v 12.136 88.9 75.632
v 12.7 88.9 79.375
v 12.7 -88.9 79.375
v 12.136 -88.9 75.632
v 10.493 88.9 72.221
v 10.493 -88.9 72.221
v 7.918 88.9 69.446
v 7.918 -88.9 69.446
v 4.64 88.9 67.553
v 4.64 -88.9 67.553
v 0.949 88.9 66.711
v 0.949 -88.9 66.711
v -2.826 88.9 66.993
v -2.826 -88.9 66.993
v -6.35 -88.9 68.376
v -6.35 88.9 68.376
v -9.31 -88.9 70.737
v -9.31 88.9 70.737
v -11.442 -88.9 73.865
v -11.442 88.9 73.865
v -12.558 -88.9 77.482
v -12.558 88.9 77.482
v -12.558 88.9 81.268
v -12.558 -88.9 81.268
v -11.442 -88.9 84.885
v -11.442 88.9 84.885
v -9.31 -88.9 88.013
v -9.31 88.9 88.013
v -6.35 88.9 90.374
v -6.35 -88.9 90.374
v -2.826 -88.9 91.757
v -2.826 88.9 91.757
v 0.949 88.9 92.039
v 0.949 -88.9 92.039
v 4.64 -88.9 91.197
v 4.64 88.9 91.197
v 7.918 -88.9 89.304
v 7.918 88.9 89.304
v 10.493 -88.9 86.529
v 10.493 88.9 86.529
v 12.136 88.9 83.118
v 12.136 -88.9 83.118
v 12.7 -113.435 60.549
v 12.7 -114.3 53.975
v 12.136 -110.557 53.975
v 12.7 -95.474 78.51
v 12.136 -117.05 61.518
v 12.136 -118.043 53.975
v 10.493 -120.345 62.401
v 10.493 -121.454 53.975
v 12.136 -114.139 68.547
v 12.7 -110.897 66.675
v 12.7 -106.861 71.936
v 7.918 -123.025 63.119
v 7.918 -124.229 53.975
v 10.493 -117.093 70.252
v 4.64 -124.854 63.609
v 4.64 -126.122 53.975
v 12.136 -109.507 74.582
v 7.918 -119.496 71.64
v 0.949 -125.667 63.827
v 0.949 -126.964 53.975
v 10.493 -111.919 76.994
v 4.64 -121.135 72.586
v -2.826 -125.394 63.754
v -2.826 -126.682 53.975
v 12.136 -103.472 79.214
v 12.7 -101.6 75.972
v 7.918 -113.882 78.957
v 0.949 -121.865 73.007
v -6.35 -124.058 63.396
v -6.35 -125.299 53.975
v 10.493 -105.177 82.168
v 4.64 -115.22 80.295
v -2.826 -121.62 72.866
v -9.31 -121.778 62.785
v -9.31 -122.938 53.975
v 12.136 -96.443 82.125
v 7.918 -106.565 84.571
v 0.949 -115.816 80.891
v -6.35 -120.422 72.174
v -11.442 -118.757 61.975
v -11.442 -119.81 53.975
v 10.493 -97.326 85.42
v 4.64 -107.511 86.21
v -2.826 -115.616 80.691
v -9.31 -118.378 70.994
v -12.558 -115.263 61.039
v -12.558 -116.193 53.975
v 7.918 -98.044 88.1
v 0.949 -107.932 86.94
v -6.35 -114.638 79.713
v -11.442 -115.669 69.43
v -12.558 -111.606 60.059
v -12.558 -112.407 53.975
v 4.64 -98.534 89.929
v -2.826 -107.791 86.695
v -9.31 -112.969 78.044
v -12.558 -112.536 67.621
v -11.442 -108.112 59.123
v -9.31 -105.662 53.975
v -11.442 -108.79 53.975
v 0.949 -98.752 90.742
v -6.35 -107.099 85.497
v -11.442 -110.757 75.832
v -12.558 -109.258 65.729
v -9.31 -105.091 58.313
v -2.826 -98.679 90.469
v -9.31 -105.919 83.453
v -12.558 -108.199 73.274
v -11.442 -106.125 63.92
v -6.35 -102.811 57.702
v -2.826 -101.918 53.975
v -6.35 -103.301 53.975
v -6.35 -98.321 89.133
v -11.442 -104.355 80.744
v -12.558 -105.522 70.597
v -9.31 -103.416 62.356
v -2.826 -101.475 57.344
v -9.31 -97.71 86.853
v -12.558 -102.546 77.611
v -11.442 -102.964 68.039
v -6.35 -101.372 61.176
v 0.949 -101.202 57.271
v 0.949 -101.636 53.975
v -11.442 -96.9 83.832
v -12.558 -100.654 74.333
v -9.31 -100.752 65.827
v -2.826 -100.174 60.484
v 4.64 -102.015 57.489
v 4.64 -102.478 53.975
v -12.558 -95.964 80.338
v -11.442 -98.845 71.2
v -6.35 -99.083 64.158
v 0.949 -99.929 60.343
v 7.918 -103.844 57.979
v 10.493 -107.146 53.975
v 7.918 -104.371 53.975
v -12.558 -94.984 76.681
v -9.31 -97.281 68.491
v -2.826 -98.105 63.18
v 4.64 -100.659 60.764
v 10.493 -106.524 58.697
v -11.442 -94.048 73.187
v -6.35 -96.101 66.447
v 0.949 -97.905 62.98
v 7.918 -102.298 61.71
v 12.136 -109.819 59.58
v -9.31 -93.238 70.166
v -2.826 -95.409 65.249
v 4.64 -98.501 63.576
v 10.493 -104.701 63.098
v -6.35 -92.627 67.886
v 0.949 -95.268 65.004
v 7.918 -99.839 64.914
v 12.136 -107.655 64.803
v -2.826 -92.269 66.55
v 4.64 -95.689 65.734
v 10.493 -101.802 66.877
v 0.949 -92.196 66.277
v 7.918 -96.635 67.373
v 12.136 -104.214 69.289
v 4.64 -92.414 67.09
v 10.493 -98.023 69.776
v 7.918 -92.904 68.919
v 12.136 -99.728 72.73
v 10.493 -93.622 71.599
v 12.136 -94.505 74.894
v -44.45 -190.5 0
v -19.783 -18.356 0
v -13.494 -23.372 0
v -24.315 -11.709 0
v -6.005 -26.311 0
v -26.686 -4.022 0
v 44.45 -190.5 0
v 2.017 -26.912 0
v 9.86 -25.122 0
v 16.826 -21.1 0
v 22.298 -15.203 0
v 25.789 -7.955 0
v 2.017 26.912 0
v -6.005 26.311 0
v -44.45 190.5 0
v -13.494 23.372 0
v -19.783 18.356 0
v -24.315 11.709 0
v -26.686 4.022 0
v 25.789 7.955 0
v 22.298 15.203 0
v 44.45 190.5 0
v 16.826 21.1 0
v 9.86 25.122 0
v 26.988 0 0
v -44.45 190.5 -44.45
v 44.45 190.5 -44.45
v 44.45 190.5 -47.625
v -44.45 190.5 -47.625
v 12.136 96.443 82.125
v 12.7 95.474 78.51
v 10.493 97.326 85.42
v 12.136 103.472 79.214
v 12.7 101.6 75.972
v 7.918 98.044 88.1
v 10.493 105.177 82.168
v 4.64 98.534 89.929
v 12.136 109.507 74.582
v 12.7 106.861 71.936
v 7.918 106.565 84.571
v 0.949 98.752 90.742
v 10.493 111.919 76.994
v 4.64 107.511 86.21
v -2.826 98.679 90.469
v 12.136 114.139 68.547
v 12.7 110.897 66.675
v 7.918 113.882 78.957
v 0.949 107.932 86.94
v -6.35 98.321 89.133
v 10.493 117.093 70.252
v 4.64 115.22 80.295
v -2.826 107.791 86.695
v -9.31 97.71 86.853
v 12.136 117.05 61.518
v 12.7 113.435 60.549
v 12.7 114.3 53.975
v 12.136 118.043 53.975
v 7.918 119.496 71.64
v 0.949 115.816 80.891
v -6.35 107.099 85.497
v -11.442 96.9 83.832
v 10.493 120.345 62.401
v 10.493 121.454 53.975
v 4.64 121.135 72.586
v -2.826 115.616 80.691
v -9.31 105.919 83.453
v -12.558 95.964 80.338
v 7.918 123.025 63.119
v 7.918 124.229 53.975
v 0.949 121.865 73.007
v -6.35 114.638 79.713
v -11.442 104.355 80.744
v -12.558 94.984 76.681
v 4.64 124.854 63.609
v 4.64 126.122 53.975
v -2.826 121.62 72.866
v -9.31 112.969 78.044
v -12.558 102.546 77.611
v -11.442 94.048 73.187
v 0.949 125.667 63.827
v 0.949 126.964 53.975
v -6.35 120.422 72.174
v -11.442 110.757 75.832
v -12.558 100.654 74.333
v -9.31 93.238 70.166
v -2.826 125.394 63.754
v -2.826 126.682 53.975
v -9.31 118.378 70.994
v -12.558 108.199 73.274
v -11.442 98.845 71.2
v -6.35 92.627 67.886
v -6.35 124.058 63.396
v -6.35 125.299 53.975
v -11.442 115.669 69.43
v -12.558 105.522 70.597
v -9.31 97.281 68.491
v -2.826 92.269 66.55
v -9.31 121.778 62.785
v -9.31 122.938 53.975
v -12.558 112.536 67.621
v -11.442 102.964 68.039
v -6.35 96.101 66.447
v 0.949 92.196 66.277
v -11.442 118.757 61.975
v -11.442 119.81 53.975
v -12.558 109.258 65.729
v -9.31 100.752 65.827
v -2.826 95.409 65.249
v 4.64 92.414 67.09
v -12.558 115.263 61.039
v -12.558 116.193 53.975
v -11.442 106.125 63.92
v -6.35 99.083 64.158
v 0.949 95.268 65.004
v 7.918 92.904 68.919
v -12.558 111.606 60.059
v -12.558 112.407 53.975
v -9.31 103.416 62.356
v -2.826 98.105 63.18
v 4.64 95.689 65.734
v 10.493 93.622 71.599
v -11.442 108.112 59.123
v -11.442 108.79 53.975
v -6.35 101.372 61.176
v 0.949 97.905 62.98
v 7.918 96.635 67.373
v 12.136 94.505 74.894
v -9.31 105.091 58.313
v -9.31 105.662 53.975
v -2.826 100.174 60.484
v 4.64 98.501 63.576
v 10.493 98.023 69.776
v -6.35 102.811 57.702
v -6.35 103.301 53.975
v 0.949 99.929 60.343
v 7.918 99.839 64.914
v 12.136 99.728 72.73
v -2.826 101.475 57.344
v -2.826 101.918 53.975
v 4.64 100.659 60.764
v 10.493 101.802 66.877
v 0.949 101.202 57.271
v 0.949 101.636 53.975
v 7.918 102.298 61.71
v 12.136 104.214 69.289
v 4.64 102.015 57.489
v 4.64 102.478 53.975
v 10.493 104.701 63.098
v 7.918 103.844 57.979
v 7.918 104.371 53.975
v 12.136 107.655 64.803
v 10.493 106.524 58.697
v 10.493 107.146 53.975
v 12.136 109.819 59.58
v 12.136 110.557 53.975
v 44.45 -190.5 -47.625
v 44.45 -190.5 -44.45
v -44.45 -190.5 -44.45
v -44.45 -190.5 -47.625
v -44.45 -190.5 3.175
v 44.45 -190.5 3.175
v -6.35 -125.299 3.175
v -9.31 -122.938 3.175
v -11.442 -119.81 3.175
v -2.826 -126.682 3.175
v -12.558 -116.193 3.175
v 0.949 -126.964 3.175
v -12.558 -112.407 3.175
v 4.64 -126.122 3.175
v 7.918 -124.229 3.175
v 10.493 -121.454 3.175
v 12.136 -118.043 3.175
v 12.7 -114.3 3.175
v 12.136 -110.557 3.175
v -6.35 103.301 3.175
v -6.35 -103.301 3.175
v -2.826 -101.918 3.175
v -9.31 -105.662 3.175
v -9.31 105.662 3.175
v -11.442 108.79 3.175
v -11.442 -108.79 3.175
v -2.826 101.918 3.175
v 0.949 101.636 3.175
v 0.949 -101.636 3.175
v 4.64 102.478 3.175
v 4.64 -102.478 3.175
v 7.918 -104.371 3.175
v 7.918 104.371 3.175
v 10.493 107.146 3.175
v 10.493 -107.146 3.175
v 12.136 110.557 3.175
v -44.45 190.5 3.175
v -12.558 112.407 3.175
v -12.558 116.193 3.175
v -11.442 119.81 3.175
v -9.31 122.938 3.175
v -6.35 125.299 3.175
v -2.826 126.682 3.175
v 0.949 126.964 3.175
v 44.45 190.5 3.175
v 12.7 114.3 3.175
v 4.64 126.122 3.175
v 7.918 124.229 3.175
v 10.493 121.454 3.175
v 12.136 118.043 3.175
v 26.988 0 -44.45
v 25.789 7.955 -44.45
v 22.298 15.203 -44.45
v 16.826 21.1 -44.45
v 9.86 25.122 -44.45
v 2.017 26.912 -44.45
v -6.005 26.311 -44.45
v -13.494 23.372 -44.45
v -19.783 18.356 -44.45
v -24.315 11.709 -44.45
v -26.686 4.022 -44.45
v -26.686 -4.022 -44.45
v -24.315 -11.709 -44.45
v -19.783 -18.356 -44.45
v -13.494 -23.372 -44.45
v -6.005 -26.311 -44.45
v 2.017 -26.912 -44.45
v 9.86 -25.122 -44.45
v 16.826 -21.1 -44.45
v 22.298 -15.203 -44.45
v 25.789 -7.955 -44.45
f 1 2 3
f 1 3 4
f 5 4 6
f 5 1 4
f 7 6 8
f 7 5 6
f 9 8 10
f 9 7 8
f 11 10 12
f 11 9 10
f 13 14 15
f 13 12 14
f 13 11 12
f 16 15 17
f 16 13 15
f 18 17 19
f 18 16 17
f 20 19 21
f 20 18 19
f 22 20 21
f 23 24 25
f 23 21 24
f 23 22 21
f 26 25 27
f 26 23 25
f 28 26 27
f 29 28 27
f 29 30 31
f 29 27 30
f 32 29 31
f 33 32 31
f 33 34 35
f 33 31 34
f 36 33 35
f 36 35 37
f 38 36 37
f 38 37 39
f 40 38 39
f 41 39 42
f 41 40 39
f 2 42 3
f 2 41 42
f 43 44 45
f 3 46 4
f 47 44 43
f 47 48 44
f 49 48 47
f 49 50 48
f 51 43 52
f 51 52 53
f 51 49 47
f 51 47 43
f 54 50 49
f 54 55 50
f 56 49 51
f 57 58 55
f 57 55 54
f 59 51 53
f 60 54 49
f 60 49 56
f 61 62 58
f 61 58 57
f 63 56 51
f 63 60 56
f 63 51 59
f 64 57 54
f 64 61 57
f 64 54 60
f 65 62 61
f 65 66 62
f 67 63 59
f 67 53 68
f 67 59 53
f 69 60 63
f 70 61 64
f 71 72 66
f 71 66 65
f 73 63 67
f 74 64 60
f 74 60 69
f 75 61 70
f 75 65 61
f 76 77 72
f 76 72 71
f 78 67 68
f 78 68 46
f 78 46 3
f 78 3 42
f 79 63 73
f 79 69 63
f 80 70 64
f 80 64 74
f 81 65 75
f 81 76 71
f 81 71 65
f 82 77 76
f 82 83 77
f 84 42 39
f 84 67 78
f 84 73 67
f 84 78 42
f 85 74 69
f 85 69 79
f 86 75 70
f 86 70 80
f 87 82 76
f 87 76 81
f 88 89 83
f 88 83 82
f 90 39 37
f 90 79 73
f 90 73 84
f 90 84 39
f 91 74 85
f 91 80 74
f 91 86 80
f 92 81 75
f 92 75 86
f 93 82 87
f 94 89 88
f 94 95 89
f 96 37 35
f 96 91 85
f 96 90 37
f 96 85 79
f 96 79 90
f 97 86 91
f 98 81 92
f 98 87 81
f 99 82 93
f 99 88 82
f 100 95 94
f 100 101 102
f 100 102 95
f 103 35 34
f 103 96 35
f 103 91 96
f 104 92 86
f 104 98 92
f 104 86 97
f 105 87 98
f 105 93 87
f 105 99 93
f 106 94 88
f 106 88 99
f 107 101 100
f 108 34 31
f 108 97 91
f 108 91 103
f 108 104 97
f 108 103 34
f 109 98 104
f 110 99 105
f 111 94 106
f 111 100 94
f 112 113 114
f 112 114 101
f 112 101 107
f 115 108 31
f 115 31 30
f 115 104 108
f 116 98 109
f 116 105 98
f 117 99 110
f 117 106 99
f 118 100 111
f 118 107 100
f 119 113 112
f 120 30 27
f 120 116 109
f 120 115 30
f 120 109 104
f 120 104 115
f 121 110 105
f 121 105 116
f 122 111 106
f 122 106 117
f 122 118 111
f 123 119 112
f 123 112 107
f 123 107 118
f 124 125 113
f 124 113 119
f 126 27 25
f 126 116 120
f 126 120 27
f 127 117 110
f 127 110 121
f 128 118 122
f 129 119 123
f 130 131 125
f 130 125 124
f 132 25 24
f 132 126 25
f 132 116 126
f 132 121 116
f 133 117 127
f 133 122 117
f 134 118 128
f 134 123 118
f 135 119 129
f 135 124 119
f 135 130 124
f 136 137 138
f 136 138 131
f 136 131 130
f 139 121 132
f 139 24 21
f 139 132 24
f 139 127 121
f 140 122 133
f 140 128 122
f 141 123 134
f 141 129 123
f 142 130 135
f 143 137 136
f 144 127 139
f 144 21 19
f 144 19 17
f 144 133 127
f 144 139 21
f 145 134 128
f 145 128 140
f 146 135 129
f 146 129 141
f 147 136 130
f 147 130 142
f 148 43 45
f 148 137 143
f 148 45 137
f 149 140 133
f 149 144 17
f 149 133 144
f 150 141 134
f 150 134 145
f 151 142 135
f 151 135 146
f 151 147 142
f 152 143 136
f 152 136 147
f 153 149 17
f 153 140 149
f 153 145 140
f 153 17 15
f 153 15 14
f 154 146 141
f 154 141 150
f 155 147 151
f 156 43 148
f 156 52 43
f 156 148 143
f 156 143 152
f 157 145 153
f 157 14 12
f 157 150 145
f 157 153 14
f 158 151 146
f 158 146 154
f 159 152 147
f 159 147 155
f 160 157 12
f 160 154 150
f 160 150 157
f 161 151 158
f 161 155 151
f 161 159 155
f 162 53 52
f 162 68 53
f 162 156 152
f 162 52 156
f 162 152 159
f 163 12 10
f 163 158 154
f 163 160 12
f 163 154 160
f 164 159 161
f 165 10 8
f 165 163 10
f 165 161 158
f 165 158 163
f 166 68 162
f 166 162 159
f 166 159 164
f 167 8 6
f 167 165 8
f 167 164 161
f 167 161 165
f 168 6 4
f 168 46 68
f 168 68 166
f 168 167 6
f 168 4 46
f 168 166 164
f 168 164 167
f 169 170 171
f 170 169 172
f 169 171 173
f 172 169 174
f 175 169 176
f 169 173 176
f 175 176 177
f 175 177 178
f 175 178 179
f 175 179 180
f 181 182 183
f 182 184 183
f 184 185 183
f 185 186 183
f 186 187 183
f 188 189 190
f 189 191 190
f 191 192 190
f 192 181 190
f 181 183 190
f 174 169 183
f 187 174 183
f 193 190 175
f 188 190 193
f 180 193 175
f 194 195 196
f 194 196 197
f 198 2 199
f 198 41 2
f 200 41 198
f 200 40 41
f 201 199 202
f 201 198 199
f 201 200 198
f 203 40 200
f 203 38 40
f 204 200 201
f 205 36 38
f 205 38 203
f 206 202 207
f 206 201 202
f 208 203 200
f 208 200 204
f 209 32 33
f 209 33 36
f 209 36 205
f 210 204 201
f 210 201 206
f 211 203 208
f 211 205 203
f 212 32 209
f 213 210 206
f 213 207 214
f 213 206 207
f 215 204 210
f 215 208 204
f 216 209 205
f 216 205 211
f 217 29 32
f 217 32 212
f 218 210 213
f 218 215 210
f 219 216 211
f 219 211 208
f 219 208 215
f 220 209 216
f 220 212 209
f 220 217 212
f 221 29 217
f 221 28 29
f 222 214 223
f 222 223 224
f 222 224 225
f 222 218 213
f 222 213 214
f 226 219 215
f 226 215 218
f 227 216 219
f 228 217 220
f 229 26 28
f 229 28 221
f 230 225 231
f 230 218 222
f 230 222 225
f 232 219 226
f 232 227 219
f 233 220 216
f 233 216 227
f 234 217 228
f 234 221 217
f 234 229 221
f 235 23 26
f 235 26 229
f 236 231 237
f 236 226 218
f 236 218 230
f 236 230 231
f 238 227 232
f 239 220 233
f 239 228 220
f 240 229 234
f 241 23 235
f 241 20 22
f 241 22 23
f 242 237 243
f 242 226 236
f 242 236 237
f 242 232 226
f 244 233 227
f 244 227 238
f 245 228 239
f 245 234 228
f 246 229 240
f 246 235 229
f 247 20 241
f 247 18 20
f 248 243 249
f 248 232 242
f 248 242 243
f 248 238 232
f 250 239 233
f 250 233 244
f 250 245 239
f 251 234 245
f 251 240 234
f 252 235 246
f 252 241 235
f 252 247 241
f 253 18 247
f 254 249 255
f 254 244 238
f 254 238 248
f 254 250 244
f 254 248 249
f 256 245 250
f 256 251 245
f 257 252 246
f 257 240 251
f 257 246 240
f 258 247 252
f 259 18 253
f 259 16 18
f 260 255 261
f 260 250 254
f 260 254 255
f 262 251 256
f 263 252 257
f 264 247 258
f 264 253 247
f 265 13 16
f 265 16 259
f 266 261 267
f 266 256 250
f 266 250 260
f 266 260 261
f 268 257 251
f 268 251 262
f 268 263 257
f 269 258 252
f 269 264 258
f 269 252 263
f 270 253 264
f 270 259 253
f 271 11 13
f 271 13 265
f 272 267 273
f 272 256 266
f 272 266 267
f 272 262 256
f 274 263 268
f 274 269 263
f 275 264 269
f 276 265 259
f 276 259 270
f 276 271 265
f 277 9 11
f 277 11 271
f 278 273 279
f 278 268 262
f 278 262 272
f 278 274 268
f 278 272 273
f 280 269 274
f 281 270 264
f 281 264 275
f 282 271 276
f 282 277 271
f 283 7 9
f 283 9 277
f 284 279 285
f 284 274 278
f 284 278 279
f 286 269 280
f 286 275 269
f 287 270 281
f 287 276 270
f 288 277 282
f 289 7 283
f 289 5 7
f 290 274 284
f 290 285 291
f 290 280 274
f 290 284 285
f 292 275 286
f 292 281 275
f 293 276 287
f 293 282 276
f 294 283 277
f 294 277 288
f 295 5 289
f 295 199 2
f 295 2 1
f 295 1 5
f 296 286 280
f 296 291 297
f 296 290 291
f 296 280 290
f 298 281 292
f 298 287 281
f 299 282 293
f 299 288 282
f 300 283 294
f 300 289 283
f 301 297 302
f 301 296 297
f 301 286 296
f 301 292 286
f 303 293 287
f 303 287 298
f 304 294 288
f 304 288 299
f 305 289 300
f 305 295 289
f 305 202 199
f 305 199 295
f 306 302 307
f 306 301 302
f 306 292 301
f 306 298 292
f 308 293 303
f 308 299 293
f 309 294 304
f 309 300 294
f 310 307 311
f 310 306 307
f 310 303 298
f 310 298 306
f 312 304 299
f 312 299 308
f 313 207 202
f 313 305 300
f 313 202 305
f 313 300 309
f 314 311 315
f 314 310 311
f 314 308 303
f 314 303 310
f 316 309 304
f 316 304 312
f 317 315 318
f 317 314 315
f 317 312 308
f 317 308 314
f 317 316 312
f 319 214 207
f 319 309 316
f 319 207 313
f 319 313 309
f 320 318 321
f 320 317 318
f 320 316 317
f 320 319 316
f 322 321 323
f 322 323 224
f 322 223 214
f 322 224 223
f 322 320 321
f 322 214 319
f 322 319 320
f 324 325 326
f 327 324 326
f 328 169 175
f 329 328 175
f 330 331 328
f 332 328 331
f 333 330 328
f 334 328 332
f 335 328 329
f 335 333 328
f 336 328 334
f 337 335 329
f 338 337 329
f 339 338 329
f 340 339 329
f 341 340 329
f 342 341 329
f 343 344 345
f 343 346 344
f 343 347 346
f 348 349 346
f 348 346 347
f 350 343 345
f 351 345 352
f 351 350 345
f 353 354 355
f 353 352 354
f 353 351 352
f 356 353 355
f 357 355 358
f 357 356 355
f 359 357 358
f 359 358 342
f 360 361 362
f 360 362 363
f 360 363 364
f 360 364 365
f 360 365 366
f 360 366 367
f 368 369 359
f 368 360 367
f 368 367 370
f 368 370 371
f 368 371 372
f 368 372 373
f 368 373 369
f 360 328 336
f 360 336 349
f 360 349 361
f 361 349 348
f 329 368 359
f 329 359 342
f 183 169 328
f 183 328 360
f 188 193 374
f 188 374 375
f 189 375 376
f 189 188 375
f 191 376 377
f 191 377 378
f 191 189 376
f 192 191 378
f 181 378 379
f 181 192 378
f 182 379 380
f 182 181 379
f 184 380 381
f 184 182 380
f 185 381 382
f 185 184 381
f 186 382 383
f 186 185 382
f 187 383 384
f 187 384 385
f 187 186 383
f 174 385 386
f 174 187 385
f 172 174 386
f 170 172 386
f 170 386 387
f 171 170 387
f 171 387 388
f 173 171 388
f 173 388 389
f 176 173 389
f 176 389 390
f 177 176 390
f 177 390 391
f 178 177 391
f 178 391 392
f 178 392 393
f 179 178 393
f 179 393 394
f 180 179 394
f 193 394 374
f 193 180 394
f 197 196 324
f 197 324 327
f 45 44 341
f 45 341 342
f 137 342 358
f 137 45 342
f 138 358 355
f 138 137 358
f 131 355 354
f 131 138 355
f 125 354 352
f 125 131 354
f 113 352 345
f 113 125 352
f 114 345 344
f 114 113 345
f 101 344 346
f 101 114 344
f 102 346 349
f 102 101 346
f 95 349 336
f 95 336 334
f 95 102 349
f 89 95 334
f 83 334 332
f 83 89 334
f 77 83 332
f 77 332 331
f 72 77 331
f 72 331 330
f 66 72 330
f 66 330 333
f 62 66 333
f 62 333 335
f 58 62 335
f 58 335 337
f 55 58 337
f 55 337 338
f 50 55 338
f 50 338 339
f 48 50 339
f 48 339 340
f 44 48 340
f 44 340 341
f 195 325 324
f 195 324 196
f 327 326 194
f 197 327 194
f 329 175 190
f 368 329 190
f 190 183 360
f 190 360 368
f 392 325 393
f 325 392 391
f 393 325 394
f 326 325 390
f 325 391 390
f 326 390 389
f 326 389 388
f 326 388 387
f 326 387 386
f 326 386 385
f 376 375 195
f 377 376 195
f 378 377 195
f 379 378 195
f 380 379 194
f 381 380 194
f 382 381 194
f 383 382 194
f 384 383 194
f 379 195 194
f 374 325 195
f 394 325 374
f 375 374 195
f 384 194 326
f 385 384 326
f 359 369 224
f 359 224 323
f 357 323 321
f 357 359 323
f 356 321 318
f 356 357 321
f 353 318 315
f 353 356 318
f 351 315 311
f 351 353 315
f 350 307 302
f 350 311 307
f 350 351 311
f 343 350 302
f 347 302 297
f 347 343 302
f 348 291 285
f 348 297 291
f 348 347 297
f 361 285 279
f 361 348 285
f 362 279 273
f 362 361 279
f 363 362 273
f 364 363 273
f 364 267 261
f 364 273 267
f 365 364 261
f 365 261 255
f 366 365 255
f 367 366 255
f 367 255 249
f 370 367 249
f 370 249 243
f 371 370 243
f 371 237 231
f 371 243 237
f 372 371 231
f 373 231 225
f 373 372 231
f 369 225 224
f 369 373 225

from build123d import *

# Parameters (mm, degrees)
SKETCH1_R           = 26.9875
BOSS_EXTRUDE1_DEPTH = 44.45
SKETCH2_W           = 88.9
SKETCH2_H           = 381
BOSS_EXTRUDE2_DEPTH = 3.175
SKETCH3_R           = 12.7
SKETCH6_W           = 88.9
SKETCH6_H           = 381
BOSS_EXTRUDE3_DEPTH = 3.175


with BuildPart() as part:
    # Sketch1 → Boss-Extrude1 (new body)
    with BuildSketch(Plane.XY):
        Circle(SKETCH1_R)
    extrude(amount=-BOSS_EXTRUDE1_DEPTH)

    # Sketch2 → Boss-Extrude2 (add)
    with BuildSketch(Plane.XY):
        Rectangle(SKETCH2_W, SKETCH2_H)
    extrude(amount=BOSS_EXTRUDE2_DEPTH)

    # Sweep1: sweep along a path in Sketch5
    with BuildLine(Plane(origin=(0, 0, 0), x_dir=(0, 0, -1), z_dir=(1, 0, 0))) as sweep1_path:
        Line((-3.175, -114.3), (-53.975, -114.3))
        ThreePointArc((-53.975, -114.3), (-71.935512242, -106.860512242), (-79.375, -88.9))
        Line((-79.375, -88.9), (-79.375, 88.9))
        ThreePointArc((-79.375, 88.9), (-71.935512242, 106.860512242), (-53.975, 114.3))
        Line((-53.975, 114.3), (-3.175, 114.3))
    # Sketch3 → Sweep1 (sweep)
    with BuildSketch(Plane.XY.offset(3.175)):
        with Locations((0, -114.3)):
            Circle(SKETCH3_R)
    sweep(path=sweep1_path.line)

    # Sketch6 → Boss-Extrude3 (add)
    with BuildSketch(Plane(origin=(0, 0, -44.45), x_dir=(-1, 0, 0), z_dir=(0, 0, -1))):
        Rectangle(SKETCH6_W, SKETCH6_H)
    extrude(amount=BOSS_EXTRUDE3_DEPTH)


solid = part.part
